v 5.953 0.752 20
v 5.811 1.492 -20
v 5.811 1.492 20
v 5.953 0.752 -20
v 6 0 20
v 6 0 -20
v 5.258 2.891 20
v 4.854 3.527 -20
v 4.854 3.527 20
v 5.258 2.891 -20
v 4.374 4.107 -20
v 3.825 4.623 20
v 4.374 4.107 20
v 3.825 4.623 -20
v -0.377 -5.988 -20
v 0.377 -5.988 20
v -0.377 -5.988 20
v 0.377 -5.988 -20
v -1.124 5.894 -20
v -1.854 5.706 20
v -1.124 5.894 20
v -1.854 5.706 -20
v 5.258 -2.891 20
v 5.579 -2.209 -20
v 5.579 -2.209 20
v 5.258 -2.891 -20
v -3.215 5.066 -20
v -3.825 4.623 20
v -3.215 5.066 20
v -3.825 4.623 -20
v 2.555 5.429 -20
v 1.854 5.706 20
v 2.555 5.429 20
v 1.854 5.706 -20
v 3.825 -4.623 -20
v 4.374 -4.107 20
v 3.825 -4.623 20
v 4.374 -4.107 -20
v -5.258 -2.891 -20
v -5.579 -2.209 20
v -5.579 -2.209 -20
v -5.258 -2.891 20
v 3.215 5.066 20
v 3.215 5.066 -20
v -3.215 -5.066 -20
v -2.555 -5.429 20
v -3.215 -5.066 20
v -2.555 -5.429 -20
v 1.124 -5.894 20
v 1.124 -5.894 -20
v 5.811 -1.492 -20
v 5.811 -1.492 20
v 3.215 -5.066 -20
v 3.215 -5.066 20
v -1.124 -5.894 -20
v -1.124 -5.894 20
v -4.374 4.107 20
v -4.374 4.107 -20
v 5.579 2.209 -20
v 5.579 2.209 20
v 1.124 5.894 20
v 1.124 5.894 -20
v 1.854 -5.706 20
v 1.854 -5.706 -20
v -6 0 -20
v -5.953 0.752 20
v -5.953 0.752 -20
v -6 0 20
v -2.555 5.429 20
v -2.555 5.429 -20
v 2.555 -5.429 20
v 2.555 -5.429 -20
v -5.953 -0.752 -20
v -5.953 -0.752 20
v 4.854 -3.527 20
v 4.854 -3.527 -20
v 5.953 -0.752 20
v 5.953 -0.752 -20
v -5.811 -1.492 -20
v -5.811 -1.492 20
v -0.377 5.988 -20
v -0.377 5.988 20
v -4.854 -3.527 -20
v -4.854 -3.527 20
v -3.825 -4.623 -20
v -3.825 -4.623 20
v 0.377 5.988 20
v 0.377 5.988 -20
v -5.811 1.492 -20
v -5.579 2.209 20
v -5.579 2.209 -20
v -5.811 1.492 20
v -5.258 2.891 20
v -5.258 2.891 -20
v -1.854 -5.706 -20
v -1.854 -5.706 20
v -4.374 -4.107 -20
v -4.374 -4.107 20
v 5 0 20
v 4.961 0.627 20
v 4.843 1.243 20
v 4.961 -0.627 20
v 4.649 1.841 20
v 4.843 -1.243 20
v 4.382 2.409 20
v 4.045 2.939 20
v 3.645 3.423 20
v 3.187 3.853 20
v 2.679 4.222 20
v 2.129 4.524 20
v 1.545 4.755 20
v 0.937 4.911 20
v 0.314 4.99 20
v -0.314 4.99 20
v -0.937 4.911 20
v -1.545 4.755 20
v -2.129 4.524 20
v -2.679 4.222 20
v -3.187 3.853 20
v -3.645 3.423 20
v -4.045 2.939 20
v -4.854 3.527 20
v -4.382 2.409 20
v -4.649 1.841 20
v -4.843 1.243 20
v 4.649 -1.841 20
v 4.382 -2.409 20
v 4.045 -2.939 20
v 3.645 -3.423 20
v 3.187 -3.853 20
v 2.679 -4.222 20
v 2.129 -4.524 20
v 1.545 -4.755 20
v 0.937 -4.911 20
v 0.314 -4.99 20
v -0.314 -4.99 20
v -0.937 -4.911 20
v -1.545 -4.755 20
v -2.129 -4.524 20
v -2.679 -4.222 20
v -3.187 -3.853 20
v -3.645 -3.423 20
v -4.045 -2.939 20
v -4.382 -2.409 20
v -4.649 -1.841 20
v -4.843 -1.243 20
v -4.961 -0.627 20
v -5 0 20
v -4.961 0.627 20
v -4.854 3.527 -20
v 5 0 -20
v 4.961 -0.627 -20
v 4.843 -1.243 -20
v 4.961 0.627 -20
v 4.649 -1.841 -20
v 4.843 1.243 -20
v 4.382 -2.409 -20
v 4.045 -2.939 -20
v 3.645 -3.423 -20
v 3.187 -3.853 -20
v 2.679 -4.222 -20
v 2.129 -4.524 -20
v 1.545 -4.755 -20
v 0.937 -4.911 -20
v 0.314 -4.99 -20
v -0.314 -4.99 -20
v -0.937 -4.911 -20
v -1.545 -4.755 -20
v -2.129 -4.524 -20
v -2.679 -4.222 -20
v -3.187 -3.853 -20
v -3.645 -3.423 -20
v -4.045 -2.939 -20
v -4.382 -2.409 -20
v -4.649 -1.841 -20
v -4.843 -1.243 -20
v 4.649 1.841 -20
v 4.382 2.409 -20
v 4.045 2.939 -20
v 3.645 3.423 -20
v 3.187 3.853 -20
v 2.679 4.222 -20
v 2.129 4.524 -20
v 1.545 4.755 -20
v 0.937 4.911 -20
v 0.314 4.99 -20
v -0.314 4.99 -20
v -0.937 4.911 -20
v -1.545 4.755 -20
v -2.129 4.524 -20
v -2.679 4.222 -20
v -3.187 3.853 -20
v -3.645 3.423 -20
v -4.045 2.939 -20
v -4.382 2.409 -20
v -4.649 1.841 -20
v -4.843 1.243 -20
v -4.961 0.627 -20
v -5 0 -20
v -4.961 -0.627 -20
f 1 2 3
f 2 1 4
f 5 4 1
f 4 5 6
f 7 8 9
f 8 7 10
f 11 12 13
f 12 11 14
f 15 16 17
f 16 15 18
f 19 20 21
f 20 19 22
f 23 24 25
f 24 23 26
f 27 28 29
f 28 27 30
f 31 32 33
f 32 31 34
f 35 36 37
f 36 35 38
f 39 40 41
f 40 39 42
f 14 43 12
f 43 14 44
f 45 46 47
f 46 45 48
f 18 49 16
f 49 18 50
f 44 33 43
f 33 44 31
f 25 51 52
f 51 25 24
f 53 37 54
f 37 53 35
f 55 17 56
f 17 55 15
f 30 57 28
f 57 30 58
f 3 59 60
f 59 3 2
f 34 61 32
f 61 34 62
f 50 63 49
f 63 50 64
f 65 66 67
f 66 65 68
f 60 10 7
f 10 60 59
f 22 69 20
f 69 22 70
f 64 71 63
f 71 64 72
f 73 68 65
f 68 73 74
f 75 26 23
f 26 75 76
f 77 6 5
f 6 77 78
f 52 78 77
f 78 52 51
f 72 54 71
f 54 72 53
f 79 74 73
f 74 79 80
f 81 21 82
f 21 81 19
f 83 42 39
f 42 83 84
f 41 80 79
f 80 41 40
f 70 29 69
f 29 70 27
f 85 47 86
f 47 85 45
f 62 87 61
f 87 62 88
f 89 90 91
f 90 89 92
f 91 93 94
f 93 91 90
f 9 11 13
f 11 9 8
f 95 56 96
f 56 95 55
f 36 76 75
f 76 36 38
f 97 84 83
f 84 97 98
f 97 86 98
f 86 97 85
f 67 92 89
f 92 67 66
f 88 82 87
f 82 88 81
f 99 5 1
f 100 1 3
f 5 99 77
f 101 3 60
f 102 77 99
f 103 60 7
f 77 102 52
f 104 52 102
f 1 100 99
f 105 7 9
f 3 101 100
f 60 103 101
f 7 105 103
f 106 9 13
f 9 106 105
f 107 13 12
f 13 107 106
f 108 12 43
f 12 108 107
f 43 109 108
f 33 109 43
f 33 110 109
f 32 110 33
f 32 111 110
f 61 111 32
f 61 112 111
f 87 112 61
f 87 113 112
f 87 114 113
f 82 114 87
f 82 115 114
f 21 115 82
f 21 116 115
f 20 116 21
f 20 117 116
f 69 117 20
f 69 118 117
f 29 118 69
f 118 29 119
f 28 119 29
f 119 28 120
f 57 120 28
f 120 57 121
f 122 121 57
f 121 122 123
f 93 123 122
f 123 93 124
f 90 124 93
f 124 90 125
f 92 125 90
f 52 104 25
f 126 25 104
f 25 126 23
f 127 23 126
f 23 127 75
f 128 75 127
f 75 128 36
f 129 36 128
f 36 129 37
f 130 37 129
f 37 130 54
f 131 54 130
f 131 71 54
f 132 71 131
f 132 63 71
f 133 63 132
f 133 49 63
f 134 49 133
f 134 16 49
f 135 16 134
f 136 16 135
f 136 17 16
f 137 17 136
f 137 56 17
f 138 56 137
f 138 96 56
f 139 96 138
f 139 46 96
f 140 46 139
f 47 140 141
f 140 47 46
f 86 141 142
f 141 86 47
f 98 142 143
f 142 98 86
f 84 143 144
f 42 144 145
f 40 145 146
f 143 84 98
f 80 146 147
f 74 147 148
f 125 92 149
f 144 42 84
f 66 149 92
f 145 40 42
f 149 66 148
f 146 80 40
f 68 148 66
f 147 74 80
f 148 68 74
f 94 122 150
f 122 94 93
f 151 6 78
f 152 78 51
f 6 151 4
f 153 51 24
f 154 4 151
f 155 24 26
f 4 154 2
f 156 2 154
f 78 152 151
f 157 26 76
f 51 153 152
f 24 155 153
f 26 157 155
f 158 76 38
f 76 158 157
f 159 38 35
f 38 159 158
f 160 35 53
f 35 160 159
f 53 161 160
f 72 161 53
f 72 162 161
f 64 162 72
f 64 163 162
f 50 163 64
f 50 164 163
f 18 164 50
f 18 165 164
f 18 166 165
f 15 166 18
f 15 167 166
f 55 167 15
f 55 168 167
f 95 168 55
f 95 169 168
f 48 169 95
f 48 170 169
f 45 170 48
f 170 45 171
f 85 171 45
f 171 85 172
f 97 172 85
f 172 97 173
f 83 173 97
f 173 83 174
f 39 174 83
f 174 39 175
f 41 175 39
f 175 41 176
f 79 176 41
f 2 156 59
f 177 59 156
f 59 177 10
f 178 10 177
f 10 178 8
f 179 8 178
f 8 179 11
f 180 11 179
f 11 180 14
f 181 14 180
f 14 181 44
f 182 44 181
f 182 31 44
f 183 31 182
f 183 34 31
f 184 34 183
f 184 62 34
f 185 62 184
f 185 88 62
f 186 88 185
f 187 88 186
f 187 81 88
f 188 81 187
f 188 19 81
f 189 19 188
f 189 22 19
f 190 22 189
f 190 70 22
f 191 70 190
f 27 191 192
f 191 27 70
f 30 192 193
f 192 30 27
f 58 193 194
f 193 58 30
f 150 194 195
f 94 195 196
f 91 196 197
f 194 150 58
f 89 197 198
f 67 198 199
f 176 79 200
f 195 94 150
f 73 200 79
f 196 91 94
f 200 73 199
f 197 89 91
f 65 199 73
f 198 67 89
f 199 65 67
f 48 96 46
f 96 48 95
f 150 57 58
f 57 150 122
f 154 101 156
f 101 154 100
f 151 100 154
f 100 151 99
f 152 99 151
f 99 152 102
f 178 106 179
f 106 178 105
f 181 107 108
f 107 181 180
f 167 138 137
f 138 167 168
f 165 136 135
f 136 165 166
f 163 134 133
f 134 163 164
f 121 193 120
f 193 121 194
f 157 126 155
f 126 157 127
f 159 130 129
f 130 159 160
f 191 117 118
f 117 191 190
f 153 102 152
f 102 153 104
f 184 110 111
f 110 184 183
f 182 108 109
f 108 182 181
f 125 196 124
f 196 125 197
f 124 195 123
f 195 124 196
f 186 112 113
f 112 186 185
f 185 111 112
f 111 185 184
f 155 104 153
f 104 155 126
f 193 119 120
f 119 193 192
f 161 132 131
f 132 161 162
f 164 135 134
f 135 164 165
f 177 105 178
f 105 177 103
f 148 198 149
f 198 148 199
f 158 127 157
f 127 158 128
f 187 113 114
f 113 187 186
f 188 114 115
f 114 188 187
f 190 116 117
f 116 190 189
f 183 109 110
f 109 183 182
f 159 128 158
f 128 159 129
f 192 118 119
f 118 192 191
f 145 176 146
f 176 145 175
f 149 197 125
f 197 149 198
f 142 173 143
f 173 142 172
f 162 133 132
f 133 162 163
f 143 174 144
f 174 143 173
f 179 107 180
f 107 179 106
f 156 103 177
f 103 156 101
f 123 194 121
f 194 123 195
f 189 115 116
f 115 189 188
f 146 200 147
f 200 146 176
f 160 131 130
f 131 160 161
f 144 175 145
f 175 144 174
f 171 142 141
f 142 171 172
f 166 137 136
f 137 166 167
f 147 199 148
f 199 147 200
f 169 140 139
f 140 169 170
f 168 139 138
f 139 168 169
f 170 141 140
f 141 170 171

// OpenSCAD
$fn = 50;


difference() {
	union() {
		translate(v = [0, 0, -20.0000000000]) {
			cylinder(h = 40, r = 6.0000000000);
		}
	}
	union() {
		translate(v = [0, 0, -100.0000000000]) {
			cylinder(h = 200, r = 5.0000000000);
		}
	}
}
